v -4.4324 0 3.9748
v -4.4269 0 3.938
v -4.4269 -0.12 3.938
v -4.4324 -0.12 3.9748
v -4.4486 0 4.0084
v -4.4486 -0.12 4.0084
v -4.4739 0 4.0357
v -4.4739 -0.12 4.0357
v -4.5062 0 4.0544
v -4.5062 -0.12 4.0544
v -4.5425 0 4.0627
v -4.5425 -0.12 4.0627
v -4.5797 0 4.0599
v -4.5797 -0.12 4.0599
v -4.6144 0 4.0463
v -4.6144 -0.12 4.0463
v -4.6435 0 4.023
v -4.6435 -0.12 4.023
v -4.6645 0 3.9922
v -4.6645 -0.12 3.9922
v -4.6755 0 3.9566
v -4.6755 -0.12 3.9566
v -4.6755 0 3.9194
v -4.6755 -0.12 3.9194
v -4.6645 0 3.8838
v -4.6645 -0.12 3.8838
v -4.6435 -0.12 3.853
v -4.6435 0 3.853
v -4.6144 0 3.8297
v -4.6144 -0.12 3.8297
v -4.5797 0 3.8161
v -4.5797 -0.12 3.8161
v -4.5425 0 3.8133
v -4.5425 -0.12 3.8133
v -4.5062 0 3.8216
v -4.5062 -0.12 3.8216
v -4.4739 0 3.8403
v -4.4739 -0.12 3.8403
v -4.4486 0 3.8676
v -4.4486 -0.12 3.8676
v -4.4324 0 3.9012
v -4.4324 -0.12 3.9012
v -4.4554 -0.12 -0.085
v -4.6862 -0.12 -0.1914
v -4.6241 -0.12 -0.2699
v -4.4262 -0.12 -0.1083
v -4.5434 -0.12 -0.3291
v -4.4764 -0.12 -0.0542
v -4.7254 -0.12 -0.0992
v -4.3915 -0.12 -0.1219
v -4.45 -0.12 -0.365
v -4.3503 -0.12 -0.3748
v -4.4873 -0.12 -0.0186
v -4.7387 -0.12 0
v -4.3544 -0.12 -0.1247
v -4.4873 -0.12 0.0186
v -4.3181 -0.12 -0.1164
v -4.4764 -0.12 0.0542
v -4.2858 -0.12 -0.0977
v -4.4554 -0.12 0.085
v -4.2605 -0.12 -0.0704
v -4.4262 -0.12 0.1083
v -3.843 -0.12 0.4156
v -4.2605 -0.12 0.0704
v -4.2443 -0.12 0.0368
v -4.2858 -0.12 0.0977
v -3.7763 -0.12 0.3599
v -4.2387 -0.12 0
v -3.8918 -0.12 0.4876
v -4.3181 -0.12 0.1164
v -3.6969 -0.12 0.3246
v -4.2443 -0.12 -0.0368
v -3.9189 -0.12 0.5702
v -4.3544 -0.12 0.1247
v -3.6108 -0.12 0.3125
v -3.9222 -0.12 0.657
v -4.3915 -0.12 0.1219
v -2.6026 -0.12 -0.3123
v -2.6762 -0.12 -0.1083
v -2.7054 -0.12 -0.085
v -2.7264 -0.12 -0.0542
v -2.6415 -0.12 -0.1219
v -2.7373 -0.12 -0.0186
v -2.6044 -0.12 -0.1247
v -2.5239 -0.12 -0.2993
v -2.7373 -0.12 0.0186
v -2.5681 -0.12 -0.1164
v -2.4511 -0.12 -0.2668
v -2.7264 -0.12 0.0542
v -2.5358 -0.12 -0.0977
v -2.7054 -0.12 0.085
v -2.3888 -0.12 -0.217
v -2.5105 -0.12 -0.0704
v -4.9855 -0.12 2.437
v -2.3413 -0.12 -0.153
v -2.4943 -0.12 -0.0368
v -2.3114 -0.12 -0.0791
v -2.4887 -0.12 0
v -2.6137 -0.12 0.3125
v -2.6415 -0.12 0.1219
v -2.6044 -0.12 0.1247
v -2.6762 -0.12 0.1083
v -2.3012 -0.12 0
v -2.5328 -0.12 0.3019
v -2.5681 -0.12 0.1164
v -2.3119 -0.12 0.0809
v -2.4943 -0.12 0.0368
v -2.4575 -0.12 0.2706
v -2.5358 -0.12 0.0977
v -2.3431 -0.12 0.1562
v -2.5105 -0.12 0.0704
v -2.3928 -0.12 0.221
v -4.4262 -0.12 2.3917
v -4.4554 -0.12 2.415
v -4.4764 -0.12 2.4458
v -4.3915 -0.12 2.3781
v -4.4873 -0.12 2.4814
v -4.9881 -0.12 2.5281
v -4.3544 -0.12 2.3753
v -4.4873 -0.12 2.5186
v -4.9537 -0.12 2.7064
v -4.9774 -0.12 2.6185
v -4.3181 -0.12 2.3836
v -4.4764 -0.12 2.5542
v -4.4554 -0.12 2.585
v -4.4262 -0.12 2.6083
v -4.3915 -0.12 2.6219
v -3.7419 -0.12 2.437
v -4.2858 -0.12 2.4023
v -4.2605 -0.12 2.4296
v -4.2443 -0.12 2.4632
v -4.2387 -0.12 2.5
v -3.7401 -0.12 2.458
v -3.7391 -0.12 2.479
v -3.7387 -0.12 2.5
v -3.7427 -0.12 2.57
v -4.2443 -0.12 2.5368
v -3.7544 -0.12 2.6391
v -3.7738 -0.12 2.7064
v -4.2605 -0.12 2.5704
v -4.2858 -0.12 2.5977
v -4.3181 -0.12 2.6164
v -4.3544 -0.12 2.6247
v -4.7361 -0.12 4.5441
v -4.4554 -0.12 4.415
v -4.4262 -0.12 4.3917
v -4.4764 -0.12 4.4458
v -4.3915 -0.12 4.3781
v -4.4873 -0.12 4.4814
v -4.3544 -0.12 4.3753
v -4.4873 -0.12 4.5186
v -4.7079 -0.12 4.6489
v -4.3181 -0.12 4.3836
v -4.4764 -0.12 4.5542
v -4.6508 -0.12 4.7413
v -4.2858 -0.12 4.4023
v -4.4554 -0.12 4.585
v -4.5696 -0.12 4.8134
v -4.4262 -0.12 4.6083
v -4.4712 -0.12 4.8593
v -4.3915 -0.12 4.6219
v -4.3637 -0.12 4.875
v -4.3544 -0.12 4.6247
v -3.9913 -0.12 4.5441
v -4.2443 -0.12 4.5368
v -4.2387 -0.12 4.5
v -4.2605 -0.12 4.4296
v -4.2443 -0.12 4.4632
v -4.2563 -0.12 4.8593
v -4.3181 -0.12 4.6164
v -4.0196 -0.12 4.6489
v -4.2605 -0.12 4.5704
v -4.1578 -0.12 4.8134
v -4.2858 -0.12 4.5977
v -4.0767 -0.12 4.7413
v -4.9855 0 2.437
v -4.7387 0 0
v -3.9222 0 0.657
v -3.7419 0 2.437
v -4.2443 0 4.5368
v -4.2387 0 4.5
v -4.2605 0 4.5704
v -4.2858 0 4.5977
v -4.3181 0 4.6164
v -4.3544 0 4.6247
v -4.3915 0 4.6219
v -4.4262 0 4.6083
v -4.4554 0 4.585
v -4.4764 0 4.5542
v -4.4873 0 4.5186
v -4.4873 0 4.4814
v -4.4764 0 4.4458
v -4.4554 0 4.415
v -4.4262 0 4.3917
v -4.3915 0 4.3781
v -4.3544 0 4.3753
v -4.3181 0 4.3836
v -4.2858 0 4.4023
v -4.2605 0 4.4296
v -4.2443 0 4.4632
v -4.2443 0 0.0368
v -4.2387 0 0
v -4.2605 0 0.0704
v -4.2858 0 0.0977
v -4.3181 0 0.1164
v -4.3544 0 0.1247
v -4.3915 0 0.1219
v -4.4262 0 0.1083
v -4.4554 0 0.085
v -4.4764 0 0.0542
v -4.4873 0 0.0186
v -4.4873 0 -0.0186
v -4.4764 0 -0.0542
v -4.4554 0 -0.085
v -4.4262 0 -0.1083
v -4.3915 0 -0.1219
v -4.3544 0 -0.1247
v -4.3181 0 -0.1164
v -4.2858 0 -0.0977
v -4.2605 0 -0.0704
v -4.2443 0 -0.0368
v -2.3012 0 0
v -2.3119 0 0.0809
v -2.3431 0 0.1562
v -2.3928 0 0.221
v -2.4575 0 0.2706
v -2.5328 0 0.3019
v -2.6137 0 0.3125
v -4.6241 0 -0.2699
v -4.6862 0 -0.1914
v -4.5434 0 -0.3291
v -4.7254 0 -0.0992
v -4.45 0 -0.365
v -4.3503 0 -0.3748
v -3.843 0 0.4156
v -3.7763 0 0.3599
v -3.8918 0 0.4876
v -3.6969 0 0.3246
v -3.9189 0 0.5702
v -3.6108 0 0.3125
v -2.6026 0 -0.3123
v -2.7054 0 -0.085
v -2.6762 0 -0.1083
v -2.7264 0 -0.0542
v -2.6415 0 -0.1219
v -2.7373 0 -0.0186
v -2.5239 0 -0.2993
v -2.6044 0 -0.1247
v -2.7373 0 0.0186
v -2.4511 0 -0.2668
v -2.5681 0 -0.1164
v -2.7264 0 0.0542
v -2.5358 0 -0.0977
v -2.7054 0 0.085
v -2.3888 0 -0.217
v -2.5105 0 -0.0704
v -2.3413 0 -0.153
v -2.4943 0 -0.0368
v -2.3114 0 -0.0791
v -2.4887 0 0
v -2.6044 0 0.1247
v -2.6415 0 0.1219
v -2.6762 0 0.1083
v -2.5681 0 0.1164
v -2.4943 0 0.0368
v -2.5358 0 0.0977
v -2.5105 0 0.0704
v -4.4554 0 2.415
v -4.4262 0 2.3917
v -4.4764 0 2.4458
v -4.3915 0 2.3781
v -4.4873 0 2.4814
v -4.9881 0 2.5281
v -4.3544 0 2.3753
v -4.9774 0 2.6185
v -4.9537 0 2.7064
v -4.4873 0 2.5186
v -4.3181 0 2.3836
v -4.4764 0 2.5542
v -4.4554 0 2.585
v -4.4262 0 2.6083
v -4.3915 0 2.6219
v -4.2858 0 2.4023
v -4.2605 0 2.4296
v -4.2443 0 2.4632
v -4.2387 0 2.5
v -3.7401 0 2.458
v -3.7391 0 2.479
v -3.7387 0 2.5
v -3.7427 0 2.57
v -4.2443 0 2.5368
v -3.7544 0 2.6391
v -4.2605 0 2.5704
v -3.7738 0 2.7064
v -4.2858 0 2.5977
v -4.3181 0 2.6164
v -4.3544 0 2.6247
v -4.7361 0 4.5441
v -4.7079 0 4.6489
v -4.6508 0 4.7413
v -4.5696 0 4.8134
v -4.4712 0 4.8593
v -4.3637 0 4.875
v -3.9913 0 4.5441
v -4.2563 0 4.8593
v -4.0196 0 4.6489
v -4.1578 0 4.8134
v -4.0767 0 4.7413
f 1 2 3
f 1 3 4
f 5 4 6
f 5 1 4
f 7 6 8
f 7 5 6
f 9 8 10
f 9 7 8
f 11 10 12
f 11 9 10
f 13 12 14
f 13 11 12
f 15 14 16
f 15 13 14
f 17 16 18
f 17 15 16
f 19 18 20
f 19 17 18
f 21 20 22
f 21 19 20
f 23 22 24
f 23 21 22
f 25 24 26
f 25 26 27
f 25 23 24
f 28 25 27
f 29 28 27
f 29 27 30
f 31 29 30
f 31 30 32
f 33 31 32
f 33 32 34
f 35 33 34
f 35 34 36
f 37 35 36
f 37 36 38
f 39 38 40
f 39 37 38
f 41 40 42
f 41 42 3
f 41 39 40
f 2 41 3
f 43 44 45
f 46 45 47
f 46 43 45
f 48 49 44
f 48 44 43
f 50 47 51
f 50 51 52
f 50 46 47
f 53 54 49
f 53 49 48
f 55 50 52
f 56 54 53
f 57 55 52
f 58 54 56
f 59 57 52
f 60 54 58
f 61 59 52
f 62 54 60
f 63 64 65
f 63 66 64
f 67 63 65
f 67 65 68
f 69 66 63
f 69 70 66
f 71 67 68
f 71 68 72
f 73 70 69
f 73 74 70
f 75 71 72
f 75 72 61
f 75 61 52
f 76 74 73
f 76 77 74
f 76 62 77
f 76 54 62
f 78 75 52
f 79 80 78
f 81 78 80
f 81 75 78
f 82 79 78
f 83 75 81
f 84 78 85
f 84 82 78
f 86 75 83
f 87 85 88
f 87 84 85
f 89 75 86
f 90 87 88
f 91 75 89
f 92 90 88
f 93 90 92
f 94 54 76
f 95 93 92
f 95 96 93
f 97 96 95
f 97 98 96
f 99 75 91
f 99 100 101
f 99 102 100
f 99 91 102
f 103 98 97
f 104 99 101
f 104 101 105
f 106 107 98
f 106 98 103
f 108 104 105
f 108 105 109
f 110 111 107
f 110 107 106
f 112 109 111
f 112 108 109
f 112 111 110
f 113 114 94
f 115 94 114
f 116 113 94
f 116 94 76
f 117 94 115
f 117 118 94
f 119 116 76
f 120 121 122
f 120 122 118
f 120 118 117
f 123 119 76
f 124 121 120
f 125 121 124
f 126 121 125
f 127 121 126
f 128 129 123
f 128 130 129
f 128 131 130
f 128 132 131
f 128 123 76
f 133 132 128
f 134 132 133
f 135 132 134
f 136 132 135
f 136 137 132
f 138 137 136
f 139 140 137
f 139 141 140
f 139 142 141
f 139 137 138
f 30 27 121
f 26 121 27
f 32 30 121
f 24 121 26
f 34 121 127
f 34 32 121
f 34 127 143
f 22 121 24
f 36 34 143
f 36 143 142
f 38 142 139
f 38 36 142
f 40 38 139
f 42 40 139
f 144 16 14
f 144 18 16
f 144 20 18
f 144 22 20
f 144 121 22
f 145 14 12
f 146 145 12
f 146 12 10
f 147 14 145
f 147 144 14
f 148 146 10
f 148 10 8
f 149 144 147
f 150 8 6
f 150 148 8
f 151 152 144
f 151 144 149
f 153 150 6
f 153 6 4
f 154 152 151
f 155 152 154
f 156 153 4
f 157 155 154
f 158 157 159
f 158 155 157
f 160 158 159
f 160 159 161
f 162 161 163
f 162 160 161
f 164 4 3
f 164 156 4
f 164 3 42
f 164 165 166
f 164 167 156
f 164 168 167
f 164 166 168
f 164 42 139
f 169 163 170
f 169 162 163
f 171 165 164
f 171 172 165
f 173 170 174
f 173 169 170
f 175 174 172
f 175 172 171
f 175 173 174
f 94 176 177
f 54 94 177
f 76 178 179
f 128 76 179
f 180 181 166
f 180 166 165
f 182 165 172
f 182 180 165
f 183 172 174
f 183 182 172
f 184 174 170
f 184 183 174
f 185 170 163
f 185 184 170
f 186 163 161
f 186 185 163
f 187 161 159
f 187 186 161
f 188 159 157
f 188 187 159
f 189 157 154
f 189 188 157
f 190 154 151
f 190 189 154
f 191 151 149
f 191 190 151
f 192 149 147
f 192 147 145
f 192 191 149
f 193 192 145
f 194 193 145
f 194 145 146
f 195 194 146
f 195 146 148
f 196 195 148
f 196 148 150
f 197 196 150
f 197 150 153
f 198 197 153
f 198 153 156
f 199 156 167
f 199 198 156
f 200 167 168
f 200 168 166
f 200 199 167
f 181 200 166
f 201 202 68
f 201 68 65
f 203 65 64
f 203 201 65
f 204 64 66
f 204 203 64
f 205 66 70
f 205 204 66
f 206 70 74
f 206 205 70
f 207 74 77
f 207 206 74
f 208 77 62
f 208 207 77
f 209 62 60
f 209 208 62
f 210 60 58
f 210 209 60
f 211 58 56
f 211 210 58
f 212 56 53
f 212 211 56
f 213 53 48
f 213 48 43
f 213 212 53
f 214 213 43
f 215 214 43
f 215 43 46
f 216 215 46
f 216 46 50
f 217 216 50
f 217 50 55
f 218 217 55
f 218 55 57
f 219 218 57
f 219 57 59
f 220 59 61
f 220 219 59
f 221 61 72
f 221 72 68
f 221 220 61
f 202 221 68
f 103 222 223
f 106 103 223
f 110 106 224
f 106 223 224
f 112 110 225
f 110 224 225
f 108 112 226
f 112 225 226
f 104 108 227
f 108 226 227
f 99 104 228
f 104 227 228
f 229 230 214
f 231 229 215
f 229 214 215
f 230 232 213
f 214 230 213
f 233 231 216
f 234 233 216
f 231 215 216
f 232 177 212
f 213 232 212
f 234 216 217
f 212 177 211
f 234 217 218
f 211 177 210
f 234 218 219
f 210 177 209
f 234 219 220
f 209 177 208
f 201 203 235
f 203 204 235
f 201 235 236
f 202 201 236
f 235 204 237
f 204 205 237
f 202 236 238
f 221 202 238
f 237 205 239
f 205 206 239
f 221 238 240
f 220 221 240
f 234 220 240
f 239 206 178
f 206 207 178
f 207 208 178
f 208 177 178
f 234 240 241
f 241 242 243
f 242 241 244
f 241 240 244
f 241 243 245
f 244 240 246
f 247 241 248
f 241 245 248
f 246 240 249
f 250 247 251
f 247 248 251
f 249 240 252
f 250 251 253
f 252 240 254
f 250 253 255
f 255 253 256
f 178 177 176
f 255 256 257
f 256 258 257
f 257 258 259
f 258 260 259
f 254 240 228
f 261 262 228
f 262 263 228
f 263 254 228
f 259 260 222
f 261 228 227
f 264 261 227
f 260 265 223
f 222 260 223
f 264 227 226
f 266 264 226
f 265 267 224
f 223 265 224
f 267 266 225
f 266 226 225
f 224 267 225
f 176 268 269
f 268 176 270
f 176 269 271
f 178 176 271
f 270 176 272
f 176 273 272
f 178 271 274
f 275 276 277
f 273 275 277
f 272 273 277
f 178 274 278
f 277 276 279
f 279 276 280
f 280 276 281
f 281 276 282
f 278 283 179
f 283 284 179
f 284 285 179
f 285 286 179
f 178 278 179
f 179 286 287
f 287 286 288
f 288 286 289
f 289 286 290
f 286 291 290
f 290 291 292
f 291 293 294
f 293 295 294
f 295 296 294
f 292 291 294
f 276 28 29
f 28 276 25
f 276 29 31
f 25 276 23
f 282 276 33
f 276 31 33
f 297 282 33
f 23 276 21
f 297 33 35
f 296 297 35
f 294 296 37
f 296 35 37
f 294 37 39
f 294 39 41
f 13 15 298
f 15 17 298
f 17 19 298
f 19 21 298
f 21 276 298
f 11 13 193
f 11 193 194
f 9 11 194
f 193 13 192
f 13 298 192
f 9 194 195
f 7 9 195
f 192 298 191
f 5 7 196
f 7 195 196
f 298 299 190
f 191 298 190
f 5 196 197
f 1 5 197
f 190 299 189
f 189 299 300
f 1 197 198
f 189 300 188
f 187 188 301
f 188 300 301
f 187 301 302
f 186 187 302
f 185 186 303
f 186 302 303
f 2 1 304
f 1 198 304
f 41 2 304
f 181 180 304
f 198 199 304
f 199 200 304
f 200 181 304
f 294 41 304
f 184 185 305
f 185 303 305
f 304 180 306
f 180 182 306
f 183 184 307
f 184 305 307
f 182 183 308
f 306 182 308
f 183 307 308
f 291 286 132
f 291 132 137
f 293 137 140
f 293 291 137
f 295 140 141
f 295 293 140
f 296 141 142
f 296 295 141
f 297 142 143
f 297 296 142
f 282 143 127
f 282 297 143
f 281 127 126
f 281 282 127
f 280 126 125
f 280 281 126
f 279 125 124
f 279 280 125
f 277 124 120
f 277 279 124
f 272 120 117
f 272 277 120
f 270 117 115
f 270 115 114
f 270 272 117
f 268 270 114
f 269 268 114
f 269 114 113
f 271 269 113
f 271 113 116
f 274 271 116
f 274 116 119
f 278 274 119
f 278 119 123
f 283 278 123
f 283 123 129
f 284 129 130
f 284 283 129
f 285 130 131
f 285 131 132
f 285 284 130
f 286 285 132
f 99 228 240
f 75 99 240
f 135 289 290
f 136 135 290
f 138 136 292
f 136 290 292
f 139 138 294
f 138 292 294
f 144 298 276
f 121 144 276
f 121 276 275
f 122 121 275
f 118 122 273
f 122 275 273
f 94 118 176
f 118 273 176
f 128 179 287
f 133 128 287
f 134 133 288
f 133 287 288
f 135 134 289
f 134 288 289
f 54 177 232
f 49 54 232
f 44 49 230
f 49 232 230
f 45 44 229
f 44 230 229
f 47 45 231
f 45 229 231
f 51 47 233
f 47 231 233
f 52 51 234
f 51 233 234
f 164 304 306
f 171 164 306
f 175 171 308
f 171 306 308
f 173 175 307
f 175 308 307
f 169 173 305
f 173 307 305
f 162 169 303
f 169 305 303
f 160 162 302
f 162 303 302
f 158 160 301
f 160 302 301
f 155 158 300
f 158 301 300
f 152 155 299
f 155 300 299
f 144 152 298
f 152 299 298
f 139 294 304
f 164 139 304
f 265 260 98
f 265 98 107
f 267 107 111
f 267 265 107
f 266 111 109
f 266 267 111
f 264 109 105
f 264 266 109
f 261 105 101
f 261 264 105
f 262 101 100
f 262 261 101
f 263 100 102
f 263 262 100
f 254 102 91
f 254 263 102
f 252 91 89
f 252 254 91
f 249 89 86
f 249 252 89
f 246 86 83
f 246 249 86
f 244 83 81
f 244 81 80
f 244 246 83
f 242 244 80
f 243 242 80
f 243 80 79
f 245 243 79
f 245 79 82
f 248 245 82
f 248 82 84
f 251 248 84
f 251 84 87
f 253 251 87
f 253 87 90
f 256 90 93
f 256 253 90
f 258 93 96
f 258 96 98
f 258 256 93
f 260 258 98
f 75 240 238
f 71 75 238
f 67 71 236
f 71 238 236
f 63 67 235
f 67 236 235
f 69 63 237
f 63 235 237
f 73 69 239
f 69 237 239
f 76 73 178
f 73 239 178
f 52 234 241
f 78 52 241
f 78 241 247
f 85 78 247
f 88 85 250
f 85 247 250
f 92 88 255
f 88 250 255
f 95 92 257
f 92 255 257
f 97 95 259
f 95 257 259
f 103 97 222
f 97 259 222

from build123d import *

# Parameters (mm, degrees)
F0_R     = 0.125
F1_DEPTH = 0.12


with BuildPart() as f1:
    # F0 (on Front) → F1 (new body)
    with BuildSketch(Plane.XZ):
        with BuildLine():
            ThreePointArc((-4.7361309042, 4.544082119), (-4.3858102586, 4.125650562), (-3.9887308951, 4.5))
            ThreePointArc((-3.9887308951, 4.5), (-3.9893814572, 4.5220793635), (-3.991330886, 4.544082119))
            ThreePointArc((-3.991330886, 4.544082119), (-4.3637308951, 4.875), (-4.7361309042, 4.544082119))
        make_face()
        with Locations((-4.3637308951, 4.5)):
            Circle(F0_R, mode=Mode.SUBTRACT)
        with BuildLine():
            ThreePointArc((-3.991330886, 4.544082119), (-3.9893814572, 4.5220793635), (-3.9887308951, 4.5))
            ThreePointArc((-3.9887308951, 4.5), (-4.3858102586, 4.125650562), (-4.7361309042, 4.544082119))
            Line((-4.7361309042, 4.544082119), (-4.9536610689, 2.7064155762))
            ThreePointArc((-4.9536610689, 2.7064155762), (-4.3637308951, 3.125), (-3.7738007214, 2.7064155762))
            Line((-3.7738007214, 2.7064155762), (-3.991330886, 4.544082119))
        make_face()
        with Locations((-4.5518772677, 3.938)):
            Circle(F0_R, mode=Mode.SUBTRACT)
        with BuildLine():
            Line((-3.7419118871, 2.4370228512), (-3.7738007214, 2.7064155762))
            ThreePointArc((-3.7738007214, 2.7064155762), (-4.3637308951, 3.125), (-4.9536610689, 2.7064155762))
            Line((-4.9536610689, 2.7064155762), (-4.9855499031, 2.4370228512))
            ThreePointArc((-4.9855499031, 2.4370228512), (-4.3637308951, 1.875), (-3.7419118871, 2.4370228512))
        make_face()
        with Locations((-4.3637308951, 2.5)):
            Circle(F0_R, mode=Mode.SUBTRACT)
        with BuildLine():
            ThreePointArc((-3.7387308951, 2.5), (-3.7475607244, 2.6046867743), (-3.7738007214, 2.7064155762))
            Line((-3.7738007214, 2.7064155762), (-3.7419118871, 2.4370228512))
            ThreePointArc((-3.7419118871, 2.4370228512), (-3.7395266497, 2.468471283), (-3.7387308951, 2.5))
        make_face()
        with BuildLine():
            Line((-4.9855499031, 2.4370228512), (-4.9536610689, 2.7064155762))
            ThreePointArc((-4.9536610689, 2.7064155762), (-4.984397577, 2.5734701984), (-4.9855499031, 2.4370228512))
        make_face()
        with BuildLine():
            Line((-3.9221867085, 0.6570389561), (-3.7419118871, 2.4370228512))
            ThreePointArc((-3.7419118871, 2.4370228512), (-4.3637308951, 1.875), (-4.9855499031, 2.4370228512))
            Line((-4.9855499031, 2.4370228512), (-4.7387308951, 0))
            ThreePointArc((-4.7387308951, 0), (-4.3637308951, 0.375), (-3.9887308951, 0))
            ThreePointArc((-3.9887308951, 0), (-4.0938723012, -0.2603869031), (-4.350338038, -0.3747607655))
            Line((-4.350338038, -0.3747607655), (-2.6025701808, -0.3123006379))
            ThreePointArc((-2.6025701808, -0.3123006379), (-2.9261810506, -0.0055812474), (-2.6137308951, 0.3125))
            Line((-2.6137308951, 0.3125), (-3.6107797493, 0.3125))
            ThreePointArc((-3.6107797493, 0.3125), (-3.8429873001, 0.4156222895), (-3.9221867085, 0.6570389561))
        make_face()
        with BuildLine():
            ThreePointArc((-3.9887308951, 0), (-4.3637308951, 0.375), (-4.7387308951, 0))
            ThreePointArc((-4.7387308951, 0), (-4.6241177982, -0.2698585939), (-4.350338038, -0.3747607655))
            ThreePointArc((-4.350338038, -0.3747607655), (-4.0938723012, -0.2603869031), (-3.9887308951, 0))
        make_face()
        with Locations((-4.3637308951, 0)):
            Circle(F0_R, mode=Mode.SUBTRACT)
        with BuildLine():
            ThreePointArc((-2.3012308951, 0), (-2.392760026, 0.2209708691), (-2.6137308951, 0.3125))
            ThreePointArc((-2.6137308951, 0.3125), (-2.9261810506, -0.0055812474), (-2.6025701808, -0.3123006379))
            ThreePointArc((-2.6025701808, -0.3123006379), (-2.3888487335, -0.2169890859), (-2.3012308951, 0))
        make_face()
        with Locations((-2.6137308951, 0)):
            Circle(F0_R, mode=Mode.SUBTRACT)
    extrude(amount=F1_DEPTH)


solid = f1.part
